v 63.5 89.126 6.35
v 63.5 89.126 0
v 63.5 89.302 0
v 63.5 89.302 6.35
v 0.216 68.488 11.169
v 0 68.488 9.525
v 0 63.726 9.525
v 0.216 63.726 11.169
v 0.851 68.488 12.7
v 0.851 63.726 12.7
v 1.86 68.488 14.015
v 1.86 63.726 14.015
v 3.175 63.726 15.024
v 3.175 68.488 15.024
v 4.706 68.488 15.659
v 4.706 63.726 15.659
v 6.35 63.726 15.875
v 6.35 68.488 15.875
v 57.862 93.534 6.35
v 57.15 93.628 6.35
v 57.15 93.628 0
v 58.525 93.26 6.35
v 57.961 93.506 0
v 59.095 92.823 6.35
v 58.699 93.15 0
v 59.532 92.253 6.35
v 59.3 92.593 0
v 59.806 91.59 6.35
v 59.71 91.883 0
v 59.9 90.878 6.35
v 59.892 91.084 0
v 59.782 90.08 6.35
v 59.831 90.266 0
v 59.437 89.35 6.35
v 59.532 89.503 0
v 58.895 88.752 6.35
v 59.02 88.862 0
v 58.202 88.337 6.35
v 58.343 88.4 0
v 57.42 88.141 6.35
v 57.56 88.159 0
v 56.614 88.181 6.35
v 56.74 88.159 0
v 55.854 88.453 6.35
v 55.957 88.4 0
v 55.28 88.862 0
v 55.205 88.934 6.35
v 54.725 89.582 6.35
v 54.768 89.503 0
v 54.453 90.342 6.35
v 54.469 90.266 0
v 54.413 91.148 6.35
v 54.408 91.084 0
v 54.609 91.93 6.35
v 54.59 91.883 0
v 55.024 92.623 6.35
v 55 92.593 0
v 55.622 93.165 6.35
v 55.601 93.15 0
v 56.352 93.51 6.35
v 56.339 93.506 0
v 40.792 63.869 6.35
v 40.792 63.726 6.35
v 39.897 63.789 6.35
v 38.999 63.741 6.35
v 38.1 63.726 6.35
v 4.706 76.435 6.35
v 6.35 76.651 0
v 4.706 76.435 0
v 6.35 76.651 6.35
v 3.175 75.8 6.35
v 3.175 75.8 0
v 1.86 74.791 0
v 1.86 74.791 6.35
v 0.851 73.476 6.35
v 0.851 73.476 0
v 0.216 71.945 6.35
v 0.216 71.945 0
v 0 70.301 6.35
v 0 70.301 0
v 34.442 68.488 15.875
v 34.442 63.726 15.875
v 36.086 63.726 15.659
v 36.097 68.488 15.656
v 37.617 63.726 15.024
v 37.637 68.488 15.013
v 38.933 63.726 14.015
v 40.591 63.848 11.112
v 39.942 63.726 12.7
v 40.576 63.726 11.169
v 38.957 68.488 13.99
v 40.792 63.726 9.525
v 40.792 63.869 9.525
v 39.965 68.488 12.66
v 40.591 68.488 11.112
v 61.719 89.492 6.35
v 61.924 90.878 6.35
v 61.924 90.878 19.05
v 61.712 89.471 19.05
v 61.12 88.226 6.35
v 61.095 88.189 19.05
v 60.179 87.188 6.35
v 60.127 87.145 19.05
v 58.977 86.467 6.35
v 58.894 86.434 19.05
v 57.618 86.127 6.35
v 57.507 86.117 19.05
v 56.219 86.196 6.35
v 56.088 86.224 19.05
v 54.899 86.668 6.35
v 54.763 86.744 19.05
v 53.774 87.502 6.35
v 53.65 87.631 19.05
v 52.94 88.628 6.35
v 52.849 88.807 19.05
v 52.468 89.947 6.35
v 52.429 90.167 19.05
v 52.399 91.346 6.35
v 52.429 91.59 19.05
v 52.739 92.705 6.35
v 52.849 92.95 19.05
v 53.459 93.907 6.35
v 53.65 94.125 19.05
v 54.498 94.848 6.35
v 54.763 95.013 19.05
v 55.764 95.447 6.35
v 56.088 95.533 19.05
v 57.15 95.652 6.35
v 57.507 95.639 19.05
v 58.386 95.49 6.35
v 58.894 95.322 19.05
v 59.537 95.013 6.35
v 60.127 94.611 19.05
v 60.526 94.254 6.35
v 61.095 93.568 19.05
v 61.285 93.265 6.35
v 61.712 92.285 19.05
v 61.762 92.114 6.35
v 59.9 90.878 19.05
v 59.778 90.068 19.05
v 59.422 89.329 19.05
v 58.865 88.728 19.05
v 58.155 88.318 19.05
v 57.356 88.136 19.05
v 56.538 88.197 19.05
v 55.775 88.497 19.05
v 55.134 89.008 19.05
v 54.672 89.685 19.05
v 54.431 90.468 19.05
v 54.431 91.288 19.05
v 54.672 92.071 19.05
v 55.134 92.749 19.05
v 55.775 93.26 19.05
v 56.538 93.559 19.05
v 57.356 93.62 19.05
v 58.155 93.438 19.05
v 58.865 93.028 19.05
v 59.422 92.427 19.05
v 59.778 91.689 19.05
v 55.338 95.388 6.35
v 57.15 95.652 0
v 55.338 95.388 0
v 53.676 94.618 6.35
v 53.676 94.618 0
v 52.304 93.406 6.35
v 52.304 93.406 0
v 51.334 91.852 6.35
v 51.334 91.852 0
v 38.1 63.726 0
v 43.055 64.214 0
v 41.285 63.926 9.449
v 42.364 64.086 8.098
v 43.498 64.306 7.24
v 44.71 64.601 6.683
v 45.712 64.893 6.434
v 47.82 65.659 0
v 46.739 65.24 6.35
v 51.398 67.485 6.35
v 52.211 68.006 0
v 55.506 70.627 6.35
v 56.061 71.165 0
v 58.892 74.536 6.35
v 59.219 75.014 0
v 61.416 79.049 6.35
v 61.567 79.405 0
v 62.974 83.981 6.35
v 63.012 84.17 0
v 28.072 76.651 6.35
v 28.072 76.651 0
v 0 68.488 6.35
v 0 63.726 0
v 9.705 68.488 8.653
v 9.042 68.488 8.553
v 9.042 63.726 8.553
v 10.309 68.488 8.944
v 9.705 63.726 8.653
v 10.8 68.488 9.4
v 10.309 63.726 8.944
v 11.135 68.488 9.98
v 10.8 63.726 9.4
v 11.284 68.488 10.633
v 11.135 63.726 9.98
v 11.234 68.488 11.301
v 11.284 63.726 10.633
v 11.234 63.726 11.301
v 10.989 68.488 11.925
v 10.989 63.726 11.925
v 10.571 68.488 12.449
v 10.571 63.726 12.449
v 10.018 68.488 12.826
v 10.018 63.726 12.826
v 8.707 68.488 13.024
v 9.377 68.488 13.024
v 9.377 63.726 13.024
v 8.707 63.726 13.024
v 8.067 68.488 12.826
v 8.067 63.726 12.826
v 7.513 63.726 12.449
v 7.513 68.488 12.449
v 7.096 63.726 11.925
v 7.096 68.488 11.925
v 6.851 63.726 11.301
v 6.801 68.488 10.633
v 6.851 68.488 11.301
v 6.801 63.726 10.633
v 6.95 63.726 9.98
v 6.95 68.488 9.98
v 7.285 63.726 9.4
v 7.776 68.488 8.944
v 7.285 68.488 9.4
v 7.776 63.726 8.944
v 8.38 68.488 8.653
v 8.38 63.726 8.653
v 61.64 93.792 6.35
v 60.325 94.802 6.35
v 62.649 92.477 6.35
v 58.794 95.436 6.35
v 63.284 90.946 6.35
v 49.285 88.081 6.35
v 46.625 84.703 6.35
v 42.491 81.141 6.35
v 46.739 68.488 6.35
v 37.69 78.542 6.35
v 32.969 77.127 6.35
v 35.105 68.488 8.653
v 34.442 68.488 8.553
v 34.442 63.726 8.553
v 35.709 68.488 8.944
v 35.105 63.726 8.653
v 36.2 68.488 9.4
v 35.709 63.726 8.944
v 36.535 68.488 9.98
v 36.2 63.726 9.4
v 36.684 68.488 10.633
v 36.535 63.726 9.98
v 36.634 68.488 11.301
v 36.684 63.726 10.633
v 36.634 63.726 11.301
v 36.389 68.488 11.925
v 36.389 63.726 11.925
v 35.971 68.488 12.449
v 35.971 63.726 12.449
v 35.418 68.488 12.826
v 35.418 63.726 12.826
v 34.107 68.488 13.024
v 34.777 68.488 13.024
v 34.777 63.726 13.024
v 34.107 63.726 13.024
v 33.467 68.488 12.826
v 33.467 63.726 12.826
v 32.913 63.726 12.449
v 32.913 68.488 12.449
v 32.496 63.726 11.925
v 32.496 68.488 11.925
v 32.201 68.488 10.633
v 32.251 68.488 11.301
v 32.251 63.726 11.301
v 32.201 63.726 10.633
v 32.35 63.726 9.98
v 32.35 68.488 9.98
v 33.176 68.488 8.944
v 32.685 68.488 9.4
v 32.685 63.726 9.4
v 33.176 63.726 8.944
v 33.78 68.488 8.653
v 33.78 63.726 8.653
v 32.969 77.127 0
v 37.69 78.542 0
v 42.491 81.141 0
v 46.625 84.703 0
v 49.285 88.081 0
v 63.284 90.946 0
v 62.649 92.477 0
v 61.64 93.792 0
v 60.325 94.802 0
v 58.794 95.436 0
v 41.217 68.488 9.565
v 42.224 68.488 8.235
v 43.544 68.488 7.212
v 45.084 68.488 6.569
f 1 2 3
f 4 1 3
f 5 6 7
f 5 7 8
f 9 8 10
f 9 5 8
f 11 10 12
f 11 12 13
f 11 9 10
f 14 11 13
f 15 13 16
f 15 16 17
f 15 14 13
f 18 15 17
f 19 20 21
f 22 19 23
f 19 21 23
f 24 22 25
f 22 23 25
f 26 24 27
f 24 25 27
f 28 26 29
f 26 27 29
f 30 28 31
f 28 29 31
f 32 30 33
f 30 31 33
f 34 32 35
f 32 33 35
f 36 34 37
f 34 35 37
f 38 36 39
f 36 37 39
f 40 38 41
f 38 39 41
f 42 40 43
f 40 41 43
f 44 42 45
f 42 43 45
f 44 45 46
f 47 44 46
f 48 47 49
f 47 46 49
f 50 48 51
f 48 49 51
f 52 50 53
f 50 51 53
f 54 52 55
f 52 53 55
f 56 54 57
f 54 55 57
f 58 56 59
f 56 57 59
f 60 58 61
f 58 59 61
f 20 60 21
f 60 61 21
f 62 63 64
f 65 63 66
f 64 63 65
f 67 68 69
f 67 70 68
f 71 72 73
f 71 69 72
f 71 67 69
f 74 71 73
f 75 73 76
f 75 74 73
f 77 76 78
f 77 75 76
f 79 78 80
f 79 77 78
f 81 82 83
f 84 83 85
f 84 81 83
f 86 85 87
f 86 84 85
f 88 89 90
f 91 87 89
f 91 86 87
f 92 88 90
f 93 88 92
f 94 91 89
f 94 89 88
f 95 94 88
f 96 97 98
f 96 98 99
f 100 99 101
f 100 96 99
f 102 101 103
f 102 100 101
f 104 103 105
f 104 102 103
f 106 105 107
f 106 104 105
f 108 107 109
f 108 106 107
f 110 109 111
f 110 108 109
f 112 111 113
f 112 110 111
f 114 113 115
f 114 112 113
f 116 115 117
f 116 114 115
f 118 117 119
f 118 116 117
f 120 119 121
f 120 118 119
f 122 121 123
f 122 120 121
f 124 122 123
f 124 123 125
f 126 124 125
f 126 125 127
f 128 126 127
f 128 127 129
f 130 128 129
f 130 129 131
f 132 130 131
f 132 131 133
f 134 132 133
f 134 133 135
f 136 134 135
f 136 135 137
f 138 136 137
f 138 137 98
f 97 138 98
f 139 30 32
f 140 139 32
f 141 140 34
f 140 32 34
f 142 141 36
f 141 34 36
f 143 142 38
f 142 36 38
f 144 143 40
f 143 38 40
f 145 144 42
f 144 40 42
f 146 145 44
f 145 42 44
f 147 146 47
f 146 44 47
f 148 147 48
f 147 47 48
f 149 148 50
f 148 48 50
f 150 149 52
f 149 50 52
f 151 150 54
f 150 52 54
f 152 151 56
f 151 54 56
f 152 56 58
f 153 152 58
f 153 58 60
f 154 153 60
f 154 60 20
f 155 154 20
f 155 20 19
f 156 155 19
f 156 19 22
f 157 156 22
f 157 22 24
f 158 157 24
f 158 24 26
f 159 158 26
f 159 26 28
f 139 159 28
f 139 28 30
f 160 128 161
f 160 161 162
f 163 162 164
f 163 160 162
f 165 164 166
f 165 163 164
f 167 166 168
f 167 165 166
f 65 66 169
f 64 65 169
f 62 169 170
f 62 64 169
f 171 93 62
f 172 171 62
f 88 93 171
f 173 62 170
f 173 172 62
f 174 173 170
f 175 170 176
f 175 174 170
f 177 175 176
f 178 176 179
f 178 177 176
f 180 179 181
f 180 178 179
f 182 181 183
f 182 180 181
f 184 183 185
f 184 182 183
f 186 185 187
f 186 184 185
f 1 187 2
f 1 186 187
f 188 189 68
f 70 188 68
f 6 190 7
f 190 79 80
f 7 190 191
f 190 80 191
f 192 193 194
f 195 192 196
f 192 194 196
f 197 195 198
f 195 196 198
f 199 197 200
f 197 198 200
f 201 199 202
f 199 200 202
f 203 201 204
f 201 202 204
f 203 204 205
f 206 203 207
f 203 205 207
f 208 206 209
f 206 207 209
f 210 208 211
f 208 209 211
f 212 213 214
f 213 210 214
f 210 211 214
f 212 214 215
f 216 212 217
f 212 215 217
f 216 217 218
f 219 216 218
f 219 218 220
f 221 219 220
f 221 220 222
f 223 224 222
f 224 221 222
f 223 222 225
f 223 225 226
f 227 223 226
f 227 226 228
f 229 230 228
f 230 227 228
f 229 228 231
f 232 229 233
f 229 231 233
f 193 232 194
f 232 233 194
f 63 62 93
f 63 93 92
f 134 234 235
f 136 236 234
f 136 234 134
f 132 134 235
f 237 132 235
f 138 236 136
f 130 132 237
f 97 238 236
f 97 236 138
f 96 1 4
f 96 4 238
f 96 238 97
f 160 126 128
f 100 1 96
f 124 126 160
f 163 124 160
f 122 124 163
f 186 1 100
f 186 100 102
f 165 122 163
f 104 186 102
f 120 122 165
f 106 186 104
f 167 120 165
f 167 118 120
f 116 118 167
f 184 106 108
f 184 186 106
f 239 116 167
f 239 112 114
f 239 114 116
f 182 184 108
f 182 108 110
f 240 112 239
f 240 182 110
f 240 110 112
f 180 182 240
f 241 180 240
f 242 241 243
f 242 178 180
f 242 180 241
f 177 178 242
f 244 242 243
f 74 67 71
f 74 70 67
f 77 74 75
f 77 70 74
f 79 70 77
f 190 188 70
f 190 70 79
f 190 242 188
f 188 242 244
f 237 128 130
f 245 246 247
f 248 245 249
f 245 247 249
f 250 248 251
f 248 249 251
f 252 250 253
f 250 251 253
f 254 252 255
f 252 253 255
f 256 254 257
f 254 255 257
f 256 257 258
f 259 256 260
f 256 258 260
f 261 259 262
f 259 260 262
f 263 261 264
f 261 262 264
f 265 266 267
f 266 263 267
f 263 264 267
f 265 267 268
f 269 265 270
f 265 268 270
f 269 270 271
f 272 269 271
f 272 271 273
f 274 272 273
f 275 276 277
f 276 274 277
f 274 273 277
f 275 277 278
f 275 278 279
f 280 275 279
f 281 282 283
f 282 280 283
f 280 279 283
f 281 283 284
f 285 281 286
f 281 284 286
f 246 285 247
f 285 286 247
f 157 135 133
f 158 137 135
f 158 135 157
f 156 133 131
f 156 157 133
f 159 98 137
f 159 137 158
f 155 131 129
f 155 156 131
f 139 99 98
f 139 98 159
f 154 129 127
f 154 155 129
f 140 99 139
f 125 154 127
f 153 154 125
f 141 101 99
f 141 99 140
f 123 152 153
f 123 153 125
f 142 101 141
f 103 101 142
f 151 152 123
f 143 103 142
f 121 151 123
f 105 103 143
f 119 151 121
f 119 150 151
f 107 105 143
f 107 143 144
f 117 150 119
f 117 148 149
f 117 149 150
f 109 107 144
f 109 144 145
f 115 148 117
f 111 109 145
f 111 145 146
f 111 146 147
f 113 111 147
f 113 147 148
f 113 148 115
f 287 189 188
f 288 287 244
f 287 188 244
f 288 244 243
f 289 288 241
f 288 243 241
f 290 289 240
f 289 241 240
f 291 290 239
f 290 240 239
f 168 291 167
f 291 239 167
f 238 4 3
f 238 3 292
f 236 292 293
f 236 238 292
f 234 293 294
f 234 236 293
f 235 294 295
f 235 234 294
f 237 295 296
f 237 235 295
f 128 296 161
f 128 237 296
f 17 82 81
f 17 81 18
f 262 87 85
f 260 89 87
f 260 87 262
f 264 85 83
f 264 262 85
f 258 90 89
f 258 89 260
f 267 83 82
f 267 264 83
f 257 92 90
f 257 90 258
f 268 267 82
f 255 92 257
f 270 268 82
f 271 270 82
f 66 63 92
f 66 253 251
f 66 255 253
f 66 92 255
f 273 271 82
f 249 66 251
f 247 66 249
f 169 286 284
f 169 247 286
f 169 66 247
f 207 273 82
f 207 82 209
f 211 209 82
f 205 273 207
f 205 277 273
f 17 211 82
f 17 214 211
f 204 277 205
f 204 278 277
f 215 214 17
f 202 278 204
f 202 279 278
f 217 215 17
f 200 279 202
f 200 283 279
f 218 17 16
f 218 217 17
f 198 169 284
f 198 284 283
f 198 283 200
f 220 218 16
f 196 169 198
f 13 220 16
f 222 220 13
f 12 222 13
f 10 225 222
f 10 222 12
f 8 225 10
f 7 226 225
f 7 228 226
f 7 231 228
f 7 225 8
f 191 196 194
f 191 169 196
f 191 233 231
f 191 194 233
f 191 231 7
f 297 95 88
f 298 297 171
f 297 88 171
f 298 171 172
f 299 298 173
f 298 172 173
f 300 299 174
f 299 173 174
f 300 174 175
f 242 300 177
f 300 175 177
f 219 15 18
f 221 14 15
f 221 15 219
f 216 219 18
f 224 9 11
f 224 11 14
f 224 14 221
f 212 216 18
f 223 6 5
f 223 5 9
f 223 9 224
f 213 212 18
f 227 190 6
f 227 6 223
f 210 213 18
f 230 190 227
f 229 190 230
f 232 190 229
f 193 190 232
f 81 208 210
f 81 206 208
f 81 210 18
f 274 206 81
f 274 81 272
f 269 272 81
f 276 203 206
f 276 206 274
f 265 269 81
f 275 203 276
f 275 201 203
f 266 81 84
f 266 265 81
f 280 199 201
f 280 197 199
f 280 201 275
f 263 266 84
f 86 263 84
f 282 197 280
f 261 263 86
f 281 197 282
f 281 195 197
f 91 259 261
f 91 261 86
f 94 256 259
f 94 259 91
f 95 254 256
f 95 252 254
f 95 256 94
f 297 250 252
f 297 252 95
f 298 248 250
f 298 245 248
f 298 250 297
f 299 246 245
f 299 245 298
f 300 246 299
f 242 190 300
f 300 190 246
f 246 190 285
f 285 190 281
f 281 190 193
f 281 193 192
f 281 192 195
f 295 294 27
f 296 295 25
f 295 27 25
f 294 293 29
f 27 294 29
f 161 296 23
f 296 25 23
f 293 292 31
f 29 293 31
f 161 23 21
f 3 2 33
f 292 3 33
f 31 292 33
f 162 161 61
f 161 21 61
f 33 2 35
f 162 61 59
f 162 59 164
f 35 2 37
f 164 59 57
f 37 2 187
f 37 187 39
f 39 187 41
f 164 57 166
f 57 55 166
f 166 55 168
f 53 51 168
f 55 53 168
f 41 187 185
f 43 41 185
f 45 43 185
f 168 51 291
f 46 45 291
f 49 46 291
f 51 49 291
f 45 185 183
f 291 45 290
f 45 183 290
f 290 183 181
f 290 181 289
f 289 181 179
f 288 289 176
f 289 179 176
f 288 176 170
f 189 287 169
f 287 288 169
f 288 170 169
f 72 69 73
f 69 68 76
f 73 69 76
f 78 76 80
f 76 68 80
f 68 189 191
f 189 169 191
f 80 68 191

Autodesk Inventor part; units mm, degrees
ref_plane "YZ Plane" through (0, 0, 0) normal (1, 0, 0) x (0, 1, 0)
ref_plane "XZ Plane" through (0, 0, 0) normal (0, 1, 0) x (-1, 0, 0)
sketch "Sketch1" plane through (0, 0, 0) normal (0, 0, 1) x (1, 0, 0)
  line L0 (0, 0) -> (63.5, 0)
  line L1 (63.5, 0) -> (63.5, 12.9255)
  line L2 (63.5, 12.9255) -> (0, 12.9255)
  line L3 (0, 12.9255) -> (0, 0)
  line L4 (63.5, 12.9255) -> (50.8, 12.9255)
  line L5 (50.8, 12.9255) -> (50.8, -19.0013)
  line L6 (50.8, -19.0013) -> (63.5, -19.0013)
  line L7 (63.5, -19.0013) -> (63.5, 12.9255)
  point P0 (57.15, -14.2271)
  point P1 (34.4424, 12.9255)
  point P2 (9.0424, 12.9255)
  dimension "d0" = 63.5
  dimension "d2" = 22.7076
  dimension "d3" = 25.4
  dimension "d4" = 27.1526
  dimension "d5" = 0
  dimension "d6" = 6.35
  dimension "d7" = 6.35
extrude "Extrusion1" add sketch "Sketch1" along normal blind 6.35
sketch "Sketch2" plane through (0, 0, 6.35) normal (0, 0, 1) x (1, 0, 0)
  line L0 (63.5, -19.0013) -> (63.5, 12.9255) projected
  line L1 (50.8, 0) -> (50.8, -19.0013) projected
  line L2 (63.5, 12.9255) -> (0, 12.9255) projected
  point P0 (0, 0)
  point P1 (57.15, -14.2271)
  dimension "d10" = 6.35
  dimension "d11" = 6.35
  dimension "d12" = 27.1526
hole "Hole1" at (57.15, -14.2271, 6.35) direction (0, 0, -1) diameter 5.5 depth 25.4 tip angle 118
sketch "Sketch3" plane through (0, 0, 6.35) normal (0, 0, 1) x (1, 0, 0)
  circle A0 centre (57.15, -14.2271) radius 2.75 projected
  circle A1 centre (57.15, -14.2271) radius 4.7742
  line L0 (50.8, -19.0013) -> (63.5, -19.0013) projected
  point P0 (0, 0)
extrude "Extrusion2" add sketch "Sketch3" along normal blind 12.7
fillet "Fillet1" radius 6.35 2 edges at (63.5, -19.0013, 3.175) (50.8, -19.0013, 3.175)
fillet "Fillet2" radius 25.4 2 edges at (50.8, 0, 3.175) (63.5, 12.9255, 3.175)
sketch "Sketch4" plane through (0, 0, 6.35) normal (0, 0, 1) x (1, 0, 0)
  line L0 (0, 12.9255) -> (0, 0) projected
  line L1 (0, 12.9255) -> (40.7924, 12.9255)
  line L2 (40.7924, 12.9255) -> (40.7924, 8.163)
  line L3 (40.7924, 8.163) -> (0, 8.163)
  line L4 (0, 8.163) -> (0, 12.9255)
  circle A0 centre (57.15, -14.2271) radius 2.75 projected
  dimension "d24" = 16.3576
  dimension "d25" = 4.7625
extrude "Extrusion3" add sketch "Sketch4" along normal blind 9.525 contours L1 L2 L3 L0
fillet "Fillet3" radius 6.35 2 edges at (40.7924, 10.5443, 15.875) (0, 10.5443, 15.875)
fillet "Fillet4" radius 6.35 1 edges at (40.7924, 10.4727, 6.35)
sketch "Sketch5" plane through (6.35, 8.163, 15.875) normal (0, -1, 0) x (1, 0, 0)
  line L0 (48.05, 3.175) -> (53.55, 3.175) projected
  point P0 (-6.35, -15.875)
  point P1 (2.6924, -5.0739)
  point P2 (28.0924, -5.0739)
  point P3 (50.8, 3.175)
  dimension "d30" = 25.4
  dimension "d31" = 22.7076
hole "Hole2" at (9.0424, 8.163, 10.8011) at (34.4424, 8.163, 10.8011) at (57.15, 8.163, 19.05) direction (0, 1, 0) diameter 4.4958 depth 25.4 tip angle 118 clearance for "Flat Head Machine Screw (82)" size "#8" standard "Ansi Unified Screw Threads"
fillet "Fillet5" radius 6.35 1 edges at (0, 0, 3.175)
ref_plane "Work Plane1" through (0, 38.3255, 0) normal (0, 1, 0) x (1, 0, 0)
mirror "Mirror1" about plane through (0, 38.3255, 0) normal (0, 1, 0) of "Extrusion3", "Fillet4", "Fillet5", "Hole2", "Fillet3", "Fillet2", "Fillet1", "Extrusion2", "Hole1", "Extrusion1"
sketch "Sketch6" plane through (0, 12.9255, 0) normal (0, 1, 0) x (1, 0, 0)
  line L0 (75.6078, -32.1869) -> (-9.353, -32.1869)
  line L1 (-9.353, -32.1869) -> (-9.353, 6.0612)
  line L2 (-9.353, 6.0612) -> (75.6078, 6.0612)
  line L3 (75.6078, 6.0612) -> (75.6078, -32.1869)
  point P0 (0, 0)
extrude "Extrusion4" cut sketch "Sketch6" against normal blind 101.6
properties part number "supporty2"
